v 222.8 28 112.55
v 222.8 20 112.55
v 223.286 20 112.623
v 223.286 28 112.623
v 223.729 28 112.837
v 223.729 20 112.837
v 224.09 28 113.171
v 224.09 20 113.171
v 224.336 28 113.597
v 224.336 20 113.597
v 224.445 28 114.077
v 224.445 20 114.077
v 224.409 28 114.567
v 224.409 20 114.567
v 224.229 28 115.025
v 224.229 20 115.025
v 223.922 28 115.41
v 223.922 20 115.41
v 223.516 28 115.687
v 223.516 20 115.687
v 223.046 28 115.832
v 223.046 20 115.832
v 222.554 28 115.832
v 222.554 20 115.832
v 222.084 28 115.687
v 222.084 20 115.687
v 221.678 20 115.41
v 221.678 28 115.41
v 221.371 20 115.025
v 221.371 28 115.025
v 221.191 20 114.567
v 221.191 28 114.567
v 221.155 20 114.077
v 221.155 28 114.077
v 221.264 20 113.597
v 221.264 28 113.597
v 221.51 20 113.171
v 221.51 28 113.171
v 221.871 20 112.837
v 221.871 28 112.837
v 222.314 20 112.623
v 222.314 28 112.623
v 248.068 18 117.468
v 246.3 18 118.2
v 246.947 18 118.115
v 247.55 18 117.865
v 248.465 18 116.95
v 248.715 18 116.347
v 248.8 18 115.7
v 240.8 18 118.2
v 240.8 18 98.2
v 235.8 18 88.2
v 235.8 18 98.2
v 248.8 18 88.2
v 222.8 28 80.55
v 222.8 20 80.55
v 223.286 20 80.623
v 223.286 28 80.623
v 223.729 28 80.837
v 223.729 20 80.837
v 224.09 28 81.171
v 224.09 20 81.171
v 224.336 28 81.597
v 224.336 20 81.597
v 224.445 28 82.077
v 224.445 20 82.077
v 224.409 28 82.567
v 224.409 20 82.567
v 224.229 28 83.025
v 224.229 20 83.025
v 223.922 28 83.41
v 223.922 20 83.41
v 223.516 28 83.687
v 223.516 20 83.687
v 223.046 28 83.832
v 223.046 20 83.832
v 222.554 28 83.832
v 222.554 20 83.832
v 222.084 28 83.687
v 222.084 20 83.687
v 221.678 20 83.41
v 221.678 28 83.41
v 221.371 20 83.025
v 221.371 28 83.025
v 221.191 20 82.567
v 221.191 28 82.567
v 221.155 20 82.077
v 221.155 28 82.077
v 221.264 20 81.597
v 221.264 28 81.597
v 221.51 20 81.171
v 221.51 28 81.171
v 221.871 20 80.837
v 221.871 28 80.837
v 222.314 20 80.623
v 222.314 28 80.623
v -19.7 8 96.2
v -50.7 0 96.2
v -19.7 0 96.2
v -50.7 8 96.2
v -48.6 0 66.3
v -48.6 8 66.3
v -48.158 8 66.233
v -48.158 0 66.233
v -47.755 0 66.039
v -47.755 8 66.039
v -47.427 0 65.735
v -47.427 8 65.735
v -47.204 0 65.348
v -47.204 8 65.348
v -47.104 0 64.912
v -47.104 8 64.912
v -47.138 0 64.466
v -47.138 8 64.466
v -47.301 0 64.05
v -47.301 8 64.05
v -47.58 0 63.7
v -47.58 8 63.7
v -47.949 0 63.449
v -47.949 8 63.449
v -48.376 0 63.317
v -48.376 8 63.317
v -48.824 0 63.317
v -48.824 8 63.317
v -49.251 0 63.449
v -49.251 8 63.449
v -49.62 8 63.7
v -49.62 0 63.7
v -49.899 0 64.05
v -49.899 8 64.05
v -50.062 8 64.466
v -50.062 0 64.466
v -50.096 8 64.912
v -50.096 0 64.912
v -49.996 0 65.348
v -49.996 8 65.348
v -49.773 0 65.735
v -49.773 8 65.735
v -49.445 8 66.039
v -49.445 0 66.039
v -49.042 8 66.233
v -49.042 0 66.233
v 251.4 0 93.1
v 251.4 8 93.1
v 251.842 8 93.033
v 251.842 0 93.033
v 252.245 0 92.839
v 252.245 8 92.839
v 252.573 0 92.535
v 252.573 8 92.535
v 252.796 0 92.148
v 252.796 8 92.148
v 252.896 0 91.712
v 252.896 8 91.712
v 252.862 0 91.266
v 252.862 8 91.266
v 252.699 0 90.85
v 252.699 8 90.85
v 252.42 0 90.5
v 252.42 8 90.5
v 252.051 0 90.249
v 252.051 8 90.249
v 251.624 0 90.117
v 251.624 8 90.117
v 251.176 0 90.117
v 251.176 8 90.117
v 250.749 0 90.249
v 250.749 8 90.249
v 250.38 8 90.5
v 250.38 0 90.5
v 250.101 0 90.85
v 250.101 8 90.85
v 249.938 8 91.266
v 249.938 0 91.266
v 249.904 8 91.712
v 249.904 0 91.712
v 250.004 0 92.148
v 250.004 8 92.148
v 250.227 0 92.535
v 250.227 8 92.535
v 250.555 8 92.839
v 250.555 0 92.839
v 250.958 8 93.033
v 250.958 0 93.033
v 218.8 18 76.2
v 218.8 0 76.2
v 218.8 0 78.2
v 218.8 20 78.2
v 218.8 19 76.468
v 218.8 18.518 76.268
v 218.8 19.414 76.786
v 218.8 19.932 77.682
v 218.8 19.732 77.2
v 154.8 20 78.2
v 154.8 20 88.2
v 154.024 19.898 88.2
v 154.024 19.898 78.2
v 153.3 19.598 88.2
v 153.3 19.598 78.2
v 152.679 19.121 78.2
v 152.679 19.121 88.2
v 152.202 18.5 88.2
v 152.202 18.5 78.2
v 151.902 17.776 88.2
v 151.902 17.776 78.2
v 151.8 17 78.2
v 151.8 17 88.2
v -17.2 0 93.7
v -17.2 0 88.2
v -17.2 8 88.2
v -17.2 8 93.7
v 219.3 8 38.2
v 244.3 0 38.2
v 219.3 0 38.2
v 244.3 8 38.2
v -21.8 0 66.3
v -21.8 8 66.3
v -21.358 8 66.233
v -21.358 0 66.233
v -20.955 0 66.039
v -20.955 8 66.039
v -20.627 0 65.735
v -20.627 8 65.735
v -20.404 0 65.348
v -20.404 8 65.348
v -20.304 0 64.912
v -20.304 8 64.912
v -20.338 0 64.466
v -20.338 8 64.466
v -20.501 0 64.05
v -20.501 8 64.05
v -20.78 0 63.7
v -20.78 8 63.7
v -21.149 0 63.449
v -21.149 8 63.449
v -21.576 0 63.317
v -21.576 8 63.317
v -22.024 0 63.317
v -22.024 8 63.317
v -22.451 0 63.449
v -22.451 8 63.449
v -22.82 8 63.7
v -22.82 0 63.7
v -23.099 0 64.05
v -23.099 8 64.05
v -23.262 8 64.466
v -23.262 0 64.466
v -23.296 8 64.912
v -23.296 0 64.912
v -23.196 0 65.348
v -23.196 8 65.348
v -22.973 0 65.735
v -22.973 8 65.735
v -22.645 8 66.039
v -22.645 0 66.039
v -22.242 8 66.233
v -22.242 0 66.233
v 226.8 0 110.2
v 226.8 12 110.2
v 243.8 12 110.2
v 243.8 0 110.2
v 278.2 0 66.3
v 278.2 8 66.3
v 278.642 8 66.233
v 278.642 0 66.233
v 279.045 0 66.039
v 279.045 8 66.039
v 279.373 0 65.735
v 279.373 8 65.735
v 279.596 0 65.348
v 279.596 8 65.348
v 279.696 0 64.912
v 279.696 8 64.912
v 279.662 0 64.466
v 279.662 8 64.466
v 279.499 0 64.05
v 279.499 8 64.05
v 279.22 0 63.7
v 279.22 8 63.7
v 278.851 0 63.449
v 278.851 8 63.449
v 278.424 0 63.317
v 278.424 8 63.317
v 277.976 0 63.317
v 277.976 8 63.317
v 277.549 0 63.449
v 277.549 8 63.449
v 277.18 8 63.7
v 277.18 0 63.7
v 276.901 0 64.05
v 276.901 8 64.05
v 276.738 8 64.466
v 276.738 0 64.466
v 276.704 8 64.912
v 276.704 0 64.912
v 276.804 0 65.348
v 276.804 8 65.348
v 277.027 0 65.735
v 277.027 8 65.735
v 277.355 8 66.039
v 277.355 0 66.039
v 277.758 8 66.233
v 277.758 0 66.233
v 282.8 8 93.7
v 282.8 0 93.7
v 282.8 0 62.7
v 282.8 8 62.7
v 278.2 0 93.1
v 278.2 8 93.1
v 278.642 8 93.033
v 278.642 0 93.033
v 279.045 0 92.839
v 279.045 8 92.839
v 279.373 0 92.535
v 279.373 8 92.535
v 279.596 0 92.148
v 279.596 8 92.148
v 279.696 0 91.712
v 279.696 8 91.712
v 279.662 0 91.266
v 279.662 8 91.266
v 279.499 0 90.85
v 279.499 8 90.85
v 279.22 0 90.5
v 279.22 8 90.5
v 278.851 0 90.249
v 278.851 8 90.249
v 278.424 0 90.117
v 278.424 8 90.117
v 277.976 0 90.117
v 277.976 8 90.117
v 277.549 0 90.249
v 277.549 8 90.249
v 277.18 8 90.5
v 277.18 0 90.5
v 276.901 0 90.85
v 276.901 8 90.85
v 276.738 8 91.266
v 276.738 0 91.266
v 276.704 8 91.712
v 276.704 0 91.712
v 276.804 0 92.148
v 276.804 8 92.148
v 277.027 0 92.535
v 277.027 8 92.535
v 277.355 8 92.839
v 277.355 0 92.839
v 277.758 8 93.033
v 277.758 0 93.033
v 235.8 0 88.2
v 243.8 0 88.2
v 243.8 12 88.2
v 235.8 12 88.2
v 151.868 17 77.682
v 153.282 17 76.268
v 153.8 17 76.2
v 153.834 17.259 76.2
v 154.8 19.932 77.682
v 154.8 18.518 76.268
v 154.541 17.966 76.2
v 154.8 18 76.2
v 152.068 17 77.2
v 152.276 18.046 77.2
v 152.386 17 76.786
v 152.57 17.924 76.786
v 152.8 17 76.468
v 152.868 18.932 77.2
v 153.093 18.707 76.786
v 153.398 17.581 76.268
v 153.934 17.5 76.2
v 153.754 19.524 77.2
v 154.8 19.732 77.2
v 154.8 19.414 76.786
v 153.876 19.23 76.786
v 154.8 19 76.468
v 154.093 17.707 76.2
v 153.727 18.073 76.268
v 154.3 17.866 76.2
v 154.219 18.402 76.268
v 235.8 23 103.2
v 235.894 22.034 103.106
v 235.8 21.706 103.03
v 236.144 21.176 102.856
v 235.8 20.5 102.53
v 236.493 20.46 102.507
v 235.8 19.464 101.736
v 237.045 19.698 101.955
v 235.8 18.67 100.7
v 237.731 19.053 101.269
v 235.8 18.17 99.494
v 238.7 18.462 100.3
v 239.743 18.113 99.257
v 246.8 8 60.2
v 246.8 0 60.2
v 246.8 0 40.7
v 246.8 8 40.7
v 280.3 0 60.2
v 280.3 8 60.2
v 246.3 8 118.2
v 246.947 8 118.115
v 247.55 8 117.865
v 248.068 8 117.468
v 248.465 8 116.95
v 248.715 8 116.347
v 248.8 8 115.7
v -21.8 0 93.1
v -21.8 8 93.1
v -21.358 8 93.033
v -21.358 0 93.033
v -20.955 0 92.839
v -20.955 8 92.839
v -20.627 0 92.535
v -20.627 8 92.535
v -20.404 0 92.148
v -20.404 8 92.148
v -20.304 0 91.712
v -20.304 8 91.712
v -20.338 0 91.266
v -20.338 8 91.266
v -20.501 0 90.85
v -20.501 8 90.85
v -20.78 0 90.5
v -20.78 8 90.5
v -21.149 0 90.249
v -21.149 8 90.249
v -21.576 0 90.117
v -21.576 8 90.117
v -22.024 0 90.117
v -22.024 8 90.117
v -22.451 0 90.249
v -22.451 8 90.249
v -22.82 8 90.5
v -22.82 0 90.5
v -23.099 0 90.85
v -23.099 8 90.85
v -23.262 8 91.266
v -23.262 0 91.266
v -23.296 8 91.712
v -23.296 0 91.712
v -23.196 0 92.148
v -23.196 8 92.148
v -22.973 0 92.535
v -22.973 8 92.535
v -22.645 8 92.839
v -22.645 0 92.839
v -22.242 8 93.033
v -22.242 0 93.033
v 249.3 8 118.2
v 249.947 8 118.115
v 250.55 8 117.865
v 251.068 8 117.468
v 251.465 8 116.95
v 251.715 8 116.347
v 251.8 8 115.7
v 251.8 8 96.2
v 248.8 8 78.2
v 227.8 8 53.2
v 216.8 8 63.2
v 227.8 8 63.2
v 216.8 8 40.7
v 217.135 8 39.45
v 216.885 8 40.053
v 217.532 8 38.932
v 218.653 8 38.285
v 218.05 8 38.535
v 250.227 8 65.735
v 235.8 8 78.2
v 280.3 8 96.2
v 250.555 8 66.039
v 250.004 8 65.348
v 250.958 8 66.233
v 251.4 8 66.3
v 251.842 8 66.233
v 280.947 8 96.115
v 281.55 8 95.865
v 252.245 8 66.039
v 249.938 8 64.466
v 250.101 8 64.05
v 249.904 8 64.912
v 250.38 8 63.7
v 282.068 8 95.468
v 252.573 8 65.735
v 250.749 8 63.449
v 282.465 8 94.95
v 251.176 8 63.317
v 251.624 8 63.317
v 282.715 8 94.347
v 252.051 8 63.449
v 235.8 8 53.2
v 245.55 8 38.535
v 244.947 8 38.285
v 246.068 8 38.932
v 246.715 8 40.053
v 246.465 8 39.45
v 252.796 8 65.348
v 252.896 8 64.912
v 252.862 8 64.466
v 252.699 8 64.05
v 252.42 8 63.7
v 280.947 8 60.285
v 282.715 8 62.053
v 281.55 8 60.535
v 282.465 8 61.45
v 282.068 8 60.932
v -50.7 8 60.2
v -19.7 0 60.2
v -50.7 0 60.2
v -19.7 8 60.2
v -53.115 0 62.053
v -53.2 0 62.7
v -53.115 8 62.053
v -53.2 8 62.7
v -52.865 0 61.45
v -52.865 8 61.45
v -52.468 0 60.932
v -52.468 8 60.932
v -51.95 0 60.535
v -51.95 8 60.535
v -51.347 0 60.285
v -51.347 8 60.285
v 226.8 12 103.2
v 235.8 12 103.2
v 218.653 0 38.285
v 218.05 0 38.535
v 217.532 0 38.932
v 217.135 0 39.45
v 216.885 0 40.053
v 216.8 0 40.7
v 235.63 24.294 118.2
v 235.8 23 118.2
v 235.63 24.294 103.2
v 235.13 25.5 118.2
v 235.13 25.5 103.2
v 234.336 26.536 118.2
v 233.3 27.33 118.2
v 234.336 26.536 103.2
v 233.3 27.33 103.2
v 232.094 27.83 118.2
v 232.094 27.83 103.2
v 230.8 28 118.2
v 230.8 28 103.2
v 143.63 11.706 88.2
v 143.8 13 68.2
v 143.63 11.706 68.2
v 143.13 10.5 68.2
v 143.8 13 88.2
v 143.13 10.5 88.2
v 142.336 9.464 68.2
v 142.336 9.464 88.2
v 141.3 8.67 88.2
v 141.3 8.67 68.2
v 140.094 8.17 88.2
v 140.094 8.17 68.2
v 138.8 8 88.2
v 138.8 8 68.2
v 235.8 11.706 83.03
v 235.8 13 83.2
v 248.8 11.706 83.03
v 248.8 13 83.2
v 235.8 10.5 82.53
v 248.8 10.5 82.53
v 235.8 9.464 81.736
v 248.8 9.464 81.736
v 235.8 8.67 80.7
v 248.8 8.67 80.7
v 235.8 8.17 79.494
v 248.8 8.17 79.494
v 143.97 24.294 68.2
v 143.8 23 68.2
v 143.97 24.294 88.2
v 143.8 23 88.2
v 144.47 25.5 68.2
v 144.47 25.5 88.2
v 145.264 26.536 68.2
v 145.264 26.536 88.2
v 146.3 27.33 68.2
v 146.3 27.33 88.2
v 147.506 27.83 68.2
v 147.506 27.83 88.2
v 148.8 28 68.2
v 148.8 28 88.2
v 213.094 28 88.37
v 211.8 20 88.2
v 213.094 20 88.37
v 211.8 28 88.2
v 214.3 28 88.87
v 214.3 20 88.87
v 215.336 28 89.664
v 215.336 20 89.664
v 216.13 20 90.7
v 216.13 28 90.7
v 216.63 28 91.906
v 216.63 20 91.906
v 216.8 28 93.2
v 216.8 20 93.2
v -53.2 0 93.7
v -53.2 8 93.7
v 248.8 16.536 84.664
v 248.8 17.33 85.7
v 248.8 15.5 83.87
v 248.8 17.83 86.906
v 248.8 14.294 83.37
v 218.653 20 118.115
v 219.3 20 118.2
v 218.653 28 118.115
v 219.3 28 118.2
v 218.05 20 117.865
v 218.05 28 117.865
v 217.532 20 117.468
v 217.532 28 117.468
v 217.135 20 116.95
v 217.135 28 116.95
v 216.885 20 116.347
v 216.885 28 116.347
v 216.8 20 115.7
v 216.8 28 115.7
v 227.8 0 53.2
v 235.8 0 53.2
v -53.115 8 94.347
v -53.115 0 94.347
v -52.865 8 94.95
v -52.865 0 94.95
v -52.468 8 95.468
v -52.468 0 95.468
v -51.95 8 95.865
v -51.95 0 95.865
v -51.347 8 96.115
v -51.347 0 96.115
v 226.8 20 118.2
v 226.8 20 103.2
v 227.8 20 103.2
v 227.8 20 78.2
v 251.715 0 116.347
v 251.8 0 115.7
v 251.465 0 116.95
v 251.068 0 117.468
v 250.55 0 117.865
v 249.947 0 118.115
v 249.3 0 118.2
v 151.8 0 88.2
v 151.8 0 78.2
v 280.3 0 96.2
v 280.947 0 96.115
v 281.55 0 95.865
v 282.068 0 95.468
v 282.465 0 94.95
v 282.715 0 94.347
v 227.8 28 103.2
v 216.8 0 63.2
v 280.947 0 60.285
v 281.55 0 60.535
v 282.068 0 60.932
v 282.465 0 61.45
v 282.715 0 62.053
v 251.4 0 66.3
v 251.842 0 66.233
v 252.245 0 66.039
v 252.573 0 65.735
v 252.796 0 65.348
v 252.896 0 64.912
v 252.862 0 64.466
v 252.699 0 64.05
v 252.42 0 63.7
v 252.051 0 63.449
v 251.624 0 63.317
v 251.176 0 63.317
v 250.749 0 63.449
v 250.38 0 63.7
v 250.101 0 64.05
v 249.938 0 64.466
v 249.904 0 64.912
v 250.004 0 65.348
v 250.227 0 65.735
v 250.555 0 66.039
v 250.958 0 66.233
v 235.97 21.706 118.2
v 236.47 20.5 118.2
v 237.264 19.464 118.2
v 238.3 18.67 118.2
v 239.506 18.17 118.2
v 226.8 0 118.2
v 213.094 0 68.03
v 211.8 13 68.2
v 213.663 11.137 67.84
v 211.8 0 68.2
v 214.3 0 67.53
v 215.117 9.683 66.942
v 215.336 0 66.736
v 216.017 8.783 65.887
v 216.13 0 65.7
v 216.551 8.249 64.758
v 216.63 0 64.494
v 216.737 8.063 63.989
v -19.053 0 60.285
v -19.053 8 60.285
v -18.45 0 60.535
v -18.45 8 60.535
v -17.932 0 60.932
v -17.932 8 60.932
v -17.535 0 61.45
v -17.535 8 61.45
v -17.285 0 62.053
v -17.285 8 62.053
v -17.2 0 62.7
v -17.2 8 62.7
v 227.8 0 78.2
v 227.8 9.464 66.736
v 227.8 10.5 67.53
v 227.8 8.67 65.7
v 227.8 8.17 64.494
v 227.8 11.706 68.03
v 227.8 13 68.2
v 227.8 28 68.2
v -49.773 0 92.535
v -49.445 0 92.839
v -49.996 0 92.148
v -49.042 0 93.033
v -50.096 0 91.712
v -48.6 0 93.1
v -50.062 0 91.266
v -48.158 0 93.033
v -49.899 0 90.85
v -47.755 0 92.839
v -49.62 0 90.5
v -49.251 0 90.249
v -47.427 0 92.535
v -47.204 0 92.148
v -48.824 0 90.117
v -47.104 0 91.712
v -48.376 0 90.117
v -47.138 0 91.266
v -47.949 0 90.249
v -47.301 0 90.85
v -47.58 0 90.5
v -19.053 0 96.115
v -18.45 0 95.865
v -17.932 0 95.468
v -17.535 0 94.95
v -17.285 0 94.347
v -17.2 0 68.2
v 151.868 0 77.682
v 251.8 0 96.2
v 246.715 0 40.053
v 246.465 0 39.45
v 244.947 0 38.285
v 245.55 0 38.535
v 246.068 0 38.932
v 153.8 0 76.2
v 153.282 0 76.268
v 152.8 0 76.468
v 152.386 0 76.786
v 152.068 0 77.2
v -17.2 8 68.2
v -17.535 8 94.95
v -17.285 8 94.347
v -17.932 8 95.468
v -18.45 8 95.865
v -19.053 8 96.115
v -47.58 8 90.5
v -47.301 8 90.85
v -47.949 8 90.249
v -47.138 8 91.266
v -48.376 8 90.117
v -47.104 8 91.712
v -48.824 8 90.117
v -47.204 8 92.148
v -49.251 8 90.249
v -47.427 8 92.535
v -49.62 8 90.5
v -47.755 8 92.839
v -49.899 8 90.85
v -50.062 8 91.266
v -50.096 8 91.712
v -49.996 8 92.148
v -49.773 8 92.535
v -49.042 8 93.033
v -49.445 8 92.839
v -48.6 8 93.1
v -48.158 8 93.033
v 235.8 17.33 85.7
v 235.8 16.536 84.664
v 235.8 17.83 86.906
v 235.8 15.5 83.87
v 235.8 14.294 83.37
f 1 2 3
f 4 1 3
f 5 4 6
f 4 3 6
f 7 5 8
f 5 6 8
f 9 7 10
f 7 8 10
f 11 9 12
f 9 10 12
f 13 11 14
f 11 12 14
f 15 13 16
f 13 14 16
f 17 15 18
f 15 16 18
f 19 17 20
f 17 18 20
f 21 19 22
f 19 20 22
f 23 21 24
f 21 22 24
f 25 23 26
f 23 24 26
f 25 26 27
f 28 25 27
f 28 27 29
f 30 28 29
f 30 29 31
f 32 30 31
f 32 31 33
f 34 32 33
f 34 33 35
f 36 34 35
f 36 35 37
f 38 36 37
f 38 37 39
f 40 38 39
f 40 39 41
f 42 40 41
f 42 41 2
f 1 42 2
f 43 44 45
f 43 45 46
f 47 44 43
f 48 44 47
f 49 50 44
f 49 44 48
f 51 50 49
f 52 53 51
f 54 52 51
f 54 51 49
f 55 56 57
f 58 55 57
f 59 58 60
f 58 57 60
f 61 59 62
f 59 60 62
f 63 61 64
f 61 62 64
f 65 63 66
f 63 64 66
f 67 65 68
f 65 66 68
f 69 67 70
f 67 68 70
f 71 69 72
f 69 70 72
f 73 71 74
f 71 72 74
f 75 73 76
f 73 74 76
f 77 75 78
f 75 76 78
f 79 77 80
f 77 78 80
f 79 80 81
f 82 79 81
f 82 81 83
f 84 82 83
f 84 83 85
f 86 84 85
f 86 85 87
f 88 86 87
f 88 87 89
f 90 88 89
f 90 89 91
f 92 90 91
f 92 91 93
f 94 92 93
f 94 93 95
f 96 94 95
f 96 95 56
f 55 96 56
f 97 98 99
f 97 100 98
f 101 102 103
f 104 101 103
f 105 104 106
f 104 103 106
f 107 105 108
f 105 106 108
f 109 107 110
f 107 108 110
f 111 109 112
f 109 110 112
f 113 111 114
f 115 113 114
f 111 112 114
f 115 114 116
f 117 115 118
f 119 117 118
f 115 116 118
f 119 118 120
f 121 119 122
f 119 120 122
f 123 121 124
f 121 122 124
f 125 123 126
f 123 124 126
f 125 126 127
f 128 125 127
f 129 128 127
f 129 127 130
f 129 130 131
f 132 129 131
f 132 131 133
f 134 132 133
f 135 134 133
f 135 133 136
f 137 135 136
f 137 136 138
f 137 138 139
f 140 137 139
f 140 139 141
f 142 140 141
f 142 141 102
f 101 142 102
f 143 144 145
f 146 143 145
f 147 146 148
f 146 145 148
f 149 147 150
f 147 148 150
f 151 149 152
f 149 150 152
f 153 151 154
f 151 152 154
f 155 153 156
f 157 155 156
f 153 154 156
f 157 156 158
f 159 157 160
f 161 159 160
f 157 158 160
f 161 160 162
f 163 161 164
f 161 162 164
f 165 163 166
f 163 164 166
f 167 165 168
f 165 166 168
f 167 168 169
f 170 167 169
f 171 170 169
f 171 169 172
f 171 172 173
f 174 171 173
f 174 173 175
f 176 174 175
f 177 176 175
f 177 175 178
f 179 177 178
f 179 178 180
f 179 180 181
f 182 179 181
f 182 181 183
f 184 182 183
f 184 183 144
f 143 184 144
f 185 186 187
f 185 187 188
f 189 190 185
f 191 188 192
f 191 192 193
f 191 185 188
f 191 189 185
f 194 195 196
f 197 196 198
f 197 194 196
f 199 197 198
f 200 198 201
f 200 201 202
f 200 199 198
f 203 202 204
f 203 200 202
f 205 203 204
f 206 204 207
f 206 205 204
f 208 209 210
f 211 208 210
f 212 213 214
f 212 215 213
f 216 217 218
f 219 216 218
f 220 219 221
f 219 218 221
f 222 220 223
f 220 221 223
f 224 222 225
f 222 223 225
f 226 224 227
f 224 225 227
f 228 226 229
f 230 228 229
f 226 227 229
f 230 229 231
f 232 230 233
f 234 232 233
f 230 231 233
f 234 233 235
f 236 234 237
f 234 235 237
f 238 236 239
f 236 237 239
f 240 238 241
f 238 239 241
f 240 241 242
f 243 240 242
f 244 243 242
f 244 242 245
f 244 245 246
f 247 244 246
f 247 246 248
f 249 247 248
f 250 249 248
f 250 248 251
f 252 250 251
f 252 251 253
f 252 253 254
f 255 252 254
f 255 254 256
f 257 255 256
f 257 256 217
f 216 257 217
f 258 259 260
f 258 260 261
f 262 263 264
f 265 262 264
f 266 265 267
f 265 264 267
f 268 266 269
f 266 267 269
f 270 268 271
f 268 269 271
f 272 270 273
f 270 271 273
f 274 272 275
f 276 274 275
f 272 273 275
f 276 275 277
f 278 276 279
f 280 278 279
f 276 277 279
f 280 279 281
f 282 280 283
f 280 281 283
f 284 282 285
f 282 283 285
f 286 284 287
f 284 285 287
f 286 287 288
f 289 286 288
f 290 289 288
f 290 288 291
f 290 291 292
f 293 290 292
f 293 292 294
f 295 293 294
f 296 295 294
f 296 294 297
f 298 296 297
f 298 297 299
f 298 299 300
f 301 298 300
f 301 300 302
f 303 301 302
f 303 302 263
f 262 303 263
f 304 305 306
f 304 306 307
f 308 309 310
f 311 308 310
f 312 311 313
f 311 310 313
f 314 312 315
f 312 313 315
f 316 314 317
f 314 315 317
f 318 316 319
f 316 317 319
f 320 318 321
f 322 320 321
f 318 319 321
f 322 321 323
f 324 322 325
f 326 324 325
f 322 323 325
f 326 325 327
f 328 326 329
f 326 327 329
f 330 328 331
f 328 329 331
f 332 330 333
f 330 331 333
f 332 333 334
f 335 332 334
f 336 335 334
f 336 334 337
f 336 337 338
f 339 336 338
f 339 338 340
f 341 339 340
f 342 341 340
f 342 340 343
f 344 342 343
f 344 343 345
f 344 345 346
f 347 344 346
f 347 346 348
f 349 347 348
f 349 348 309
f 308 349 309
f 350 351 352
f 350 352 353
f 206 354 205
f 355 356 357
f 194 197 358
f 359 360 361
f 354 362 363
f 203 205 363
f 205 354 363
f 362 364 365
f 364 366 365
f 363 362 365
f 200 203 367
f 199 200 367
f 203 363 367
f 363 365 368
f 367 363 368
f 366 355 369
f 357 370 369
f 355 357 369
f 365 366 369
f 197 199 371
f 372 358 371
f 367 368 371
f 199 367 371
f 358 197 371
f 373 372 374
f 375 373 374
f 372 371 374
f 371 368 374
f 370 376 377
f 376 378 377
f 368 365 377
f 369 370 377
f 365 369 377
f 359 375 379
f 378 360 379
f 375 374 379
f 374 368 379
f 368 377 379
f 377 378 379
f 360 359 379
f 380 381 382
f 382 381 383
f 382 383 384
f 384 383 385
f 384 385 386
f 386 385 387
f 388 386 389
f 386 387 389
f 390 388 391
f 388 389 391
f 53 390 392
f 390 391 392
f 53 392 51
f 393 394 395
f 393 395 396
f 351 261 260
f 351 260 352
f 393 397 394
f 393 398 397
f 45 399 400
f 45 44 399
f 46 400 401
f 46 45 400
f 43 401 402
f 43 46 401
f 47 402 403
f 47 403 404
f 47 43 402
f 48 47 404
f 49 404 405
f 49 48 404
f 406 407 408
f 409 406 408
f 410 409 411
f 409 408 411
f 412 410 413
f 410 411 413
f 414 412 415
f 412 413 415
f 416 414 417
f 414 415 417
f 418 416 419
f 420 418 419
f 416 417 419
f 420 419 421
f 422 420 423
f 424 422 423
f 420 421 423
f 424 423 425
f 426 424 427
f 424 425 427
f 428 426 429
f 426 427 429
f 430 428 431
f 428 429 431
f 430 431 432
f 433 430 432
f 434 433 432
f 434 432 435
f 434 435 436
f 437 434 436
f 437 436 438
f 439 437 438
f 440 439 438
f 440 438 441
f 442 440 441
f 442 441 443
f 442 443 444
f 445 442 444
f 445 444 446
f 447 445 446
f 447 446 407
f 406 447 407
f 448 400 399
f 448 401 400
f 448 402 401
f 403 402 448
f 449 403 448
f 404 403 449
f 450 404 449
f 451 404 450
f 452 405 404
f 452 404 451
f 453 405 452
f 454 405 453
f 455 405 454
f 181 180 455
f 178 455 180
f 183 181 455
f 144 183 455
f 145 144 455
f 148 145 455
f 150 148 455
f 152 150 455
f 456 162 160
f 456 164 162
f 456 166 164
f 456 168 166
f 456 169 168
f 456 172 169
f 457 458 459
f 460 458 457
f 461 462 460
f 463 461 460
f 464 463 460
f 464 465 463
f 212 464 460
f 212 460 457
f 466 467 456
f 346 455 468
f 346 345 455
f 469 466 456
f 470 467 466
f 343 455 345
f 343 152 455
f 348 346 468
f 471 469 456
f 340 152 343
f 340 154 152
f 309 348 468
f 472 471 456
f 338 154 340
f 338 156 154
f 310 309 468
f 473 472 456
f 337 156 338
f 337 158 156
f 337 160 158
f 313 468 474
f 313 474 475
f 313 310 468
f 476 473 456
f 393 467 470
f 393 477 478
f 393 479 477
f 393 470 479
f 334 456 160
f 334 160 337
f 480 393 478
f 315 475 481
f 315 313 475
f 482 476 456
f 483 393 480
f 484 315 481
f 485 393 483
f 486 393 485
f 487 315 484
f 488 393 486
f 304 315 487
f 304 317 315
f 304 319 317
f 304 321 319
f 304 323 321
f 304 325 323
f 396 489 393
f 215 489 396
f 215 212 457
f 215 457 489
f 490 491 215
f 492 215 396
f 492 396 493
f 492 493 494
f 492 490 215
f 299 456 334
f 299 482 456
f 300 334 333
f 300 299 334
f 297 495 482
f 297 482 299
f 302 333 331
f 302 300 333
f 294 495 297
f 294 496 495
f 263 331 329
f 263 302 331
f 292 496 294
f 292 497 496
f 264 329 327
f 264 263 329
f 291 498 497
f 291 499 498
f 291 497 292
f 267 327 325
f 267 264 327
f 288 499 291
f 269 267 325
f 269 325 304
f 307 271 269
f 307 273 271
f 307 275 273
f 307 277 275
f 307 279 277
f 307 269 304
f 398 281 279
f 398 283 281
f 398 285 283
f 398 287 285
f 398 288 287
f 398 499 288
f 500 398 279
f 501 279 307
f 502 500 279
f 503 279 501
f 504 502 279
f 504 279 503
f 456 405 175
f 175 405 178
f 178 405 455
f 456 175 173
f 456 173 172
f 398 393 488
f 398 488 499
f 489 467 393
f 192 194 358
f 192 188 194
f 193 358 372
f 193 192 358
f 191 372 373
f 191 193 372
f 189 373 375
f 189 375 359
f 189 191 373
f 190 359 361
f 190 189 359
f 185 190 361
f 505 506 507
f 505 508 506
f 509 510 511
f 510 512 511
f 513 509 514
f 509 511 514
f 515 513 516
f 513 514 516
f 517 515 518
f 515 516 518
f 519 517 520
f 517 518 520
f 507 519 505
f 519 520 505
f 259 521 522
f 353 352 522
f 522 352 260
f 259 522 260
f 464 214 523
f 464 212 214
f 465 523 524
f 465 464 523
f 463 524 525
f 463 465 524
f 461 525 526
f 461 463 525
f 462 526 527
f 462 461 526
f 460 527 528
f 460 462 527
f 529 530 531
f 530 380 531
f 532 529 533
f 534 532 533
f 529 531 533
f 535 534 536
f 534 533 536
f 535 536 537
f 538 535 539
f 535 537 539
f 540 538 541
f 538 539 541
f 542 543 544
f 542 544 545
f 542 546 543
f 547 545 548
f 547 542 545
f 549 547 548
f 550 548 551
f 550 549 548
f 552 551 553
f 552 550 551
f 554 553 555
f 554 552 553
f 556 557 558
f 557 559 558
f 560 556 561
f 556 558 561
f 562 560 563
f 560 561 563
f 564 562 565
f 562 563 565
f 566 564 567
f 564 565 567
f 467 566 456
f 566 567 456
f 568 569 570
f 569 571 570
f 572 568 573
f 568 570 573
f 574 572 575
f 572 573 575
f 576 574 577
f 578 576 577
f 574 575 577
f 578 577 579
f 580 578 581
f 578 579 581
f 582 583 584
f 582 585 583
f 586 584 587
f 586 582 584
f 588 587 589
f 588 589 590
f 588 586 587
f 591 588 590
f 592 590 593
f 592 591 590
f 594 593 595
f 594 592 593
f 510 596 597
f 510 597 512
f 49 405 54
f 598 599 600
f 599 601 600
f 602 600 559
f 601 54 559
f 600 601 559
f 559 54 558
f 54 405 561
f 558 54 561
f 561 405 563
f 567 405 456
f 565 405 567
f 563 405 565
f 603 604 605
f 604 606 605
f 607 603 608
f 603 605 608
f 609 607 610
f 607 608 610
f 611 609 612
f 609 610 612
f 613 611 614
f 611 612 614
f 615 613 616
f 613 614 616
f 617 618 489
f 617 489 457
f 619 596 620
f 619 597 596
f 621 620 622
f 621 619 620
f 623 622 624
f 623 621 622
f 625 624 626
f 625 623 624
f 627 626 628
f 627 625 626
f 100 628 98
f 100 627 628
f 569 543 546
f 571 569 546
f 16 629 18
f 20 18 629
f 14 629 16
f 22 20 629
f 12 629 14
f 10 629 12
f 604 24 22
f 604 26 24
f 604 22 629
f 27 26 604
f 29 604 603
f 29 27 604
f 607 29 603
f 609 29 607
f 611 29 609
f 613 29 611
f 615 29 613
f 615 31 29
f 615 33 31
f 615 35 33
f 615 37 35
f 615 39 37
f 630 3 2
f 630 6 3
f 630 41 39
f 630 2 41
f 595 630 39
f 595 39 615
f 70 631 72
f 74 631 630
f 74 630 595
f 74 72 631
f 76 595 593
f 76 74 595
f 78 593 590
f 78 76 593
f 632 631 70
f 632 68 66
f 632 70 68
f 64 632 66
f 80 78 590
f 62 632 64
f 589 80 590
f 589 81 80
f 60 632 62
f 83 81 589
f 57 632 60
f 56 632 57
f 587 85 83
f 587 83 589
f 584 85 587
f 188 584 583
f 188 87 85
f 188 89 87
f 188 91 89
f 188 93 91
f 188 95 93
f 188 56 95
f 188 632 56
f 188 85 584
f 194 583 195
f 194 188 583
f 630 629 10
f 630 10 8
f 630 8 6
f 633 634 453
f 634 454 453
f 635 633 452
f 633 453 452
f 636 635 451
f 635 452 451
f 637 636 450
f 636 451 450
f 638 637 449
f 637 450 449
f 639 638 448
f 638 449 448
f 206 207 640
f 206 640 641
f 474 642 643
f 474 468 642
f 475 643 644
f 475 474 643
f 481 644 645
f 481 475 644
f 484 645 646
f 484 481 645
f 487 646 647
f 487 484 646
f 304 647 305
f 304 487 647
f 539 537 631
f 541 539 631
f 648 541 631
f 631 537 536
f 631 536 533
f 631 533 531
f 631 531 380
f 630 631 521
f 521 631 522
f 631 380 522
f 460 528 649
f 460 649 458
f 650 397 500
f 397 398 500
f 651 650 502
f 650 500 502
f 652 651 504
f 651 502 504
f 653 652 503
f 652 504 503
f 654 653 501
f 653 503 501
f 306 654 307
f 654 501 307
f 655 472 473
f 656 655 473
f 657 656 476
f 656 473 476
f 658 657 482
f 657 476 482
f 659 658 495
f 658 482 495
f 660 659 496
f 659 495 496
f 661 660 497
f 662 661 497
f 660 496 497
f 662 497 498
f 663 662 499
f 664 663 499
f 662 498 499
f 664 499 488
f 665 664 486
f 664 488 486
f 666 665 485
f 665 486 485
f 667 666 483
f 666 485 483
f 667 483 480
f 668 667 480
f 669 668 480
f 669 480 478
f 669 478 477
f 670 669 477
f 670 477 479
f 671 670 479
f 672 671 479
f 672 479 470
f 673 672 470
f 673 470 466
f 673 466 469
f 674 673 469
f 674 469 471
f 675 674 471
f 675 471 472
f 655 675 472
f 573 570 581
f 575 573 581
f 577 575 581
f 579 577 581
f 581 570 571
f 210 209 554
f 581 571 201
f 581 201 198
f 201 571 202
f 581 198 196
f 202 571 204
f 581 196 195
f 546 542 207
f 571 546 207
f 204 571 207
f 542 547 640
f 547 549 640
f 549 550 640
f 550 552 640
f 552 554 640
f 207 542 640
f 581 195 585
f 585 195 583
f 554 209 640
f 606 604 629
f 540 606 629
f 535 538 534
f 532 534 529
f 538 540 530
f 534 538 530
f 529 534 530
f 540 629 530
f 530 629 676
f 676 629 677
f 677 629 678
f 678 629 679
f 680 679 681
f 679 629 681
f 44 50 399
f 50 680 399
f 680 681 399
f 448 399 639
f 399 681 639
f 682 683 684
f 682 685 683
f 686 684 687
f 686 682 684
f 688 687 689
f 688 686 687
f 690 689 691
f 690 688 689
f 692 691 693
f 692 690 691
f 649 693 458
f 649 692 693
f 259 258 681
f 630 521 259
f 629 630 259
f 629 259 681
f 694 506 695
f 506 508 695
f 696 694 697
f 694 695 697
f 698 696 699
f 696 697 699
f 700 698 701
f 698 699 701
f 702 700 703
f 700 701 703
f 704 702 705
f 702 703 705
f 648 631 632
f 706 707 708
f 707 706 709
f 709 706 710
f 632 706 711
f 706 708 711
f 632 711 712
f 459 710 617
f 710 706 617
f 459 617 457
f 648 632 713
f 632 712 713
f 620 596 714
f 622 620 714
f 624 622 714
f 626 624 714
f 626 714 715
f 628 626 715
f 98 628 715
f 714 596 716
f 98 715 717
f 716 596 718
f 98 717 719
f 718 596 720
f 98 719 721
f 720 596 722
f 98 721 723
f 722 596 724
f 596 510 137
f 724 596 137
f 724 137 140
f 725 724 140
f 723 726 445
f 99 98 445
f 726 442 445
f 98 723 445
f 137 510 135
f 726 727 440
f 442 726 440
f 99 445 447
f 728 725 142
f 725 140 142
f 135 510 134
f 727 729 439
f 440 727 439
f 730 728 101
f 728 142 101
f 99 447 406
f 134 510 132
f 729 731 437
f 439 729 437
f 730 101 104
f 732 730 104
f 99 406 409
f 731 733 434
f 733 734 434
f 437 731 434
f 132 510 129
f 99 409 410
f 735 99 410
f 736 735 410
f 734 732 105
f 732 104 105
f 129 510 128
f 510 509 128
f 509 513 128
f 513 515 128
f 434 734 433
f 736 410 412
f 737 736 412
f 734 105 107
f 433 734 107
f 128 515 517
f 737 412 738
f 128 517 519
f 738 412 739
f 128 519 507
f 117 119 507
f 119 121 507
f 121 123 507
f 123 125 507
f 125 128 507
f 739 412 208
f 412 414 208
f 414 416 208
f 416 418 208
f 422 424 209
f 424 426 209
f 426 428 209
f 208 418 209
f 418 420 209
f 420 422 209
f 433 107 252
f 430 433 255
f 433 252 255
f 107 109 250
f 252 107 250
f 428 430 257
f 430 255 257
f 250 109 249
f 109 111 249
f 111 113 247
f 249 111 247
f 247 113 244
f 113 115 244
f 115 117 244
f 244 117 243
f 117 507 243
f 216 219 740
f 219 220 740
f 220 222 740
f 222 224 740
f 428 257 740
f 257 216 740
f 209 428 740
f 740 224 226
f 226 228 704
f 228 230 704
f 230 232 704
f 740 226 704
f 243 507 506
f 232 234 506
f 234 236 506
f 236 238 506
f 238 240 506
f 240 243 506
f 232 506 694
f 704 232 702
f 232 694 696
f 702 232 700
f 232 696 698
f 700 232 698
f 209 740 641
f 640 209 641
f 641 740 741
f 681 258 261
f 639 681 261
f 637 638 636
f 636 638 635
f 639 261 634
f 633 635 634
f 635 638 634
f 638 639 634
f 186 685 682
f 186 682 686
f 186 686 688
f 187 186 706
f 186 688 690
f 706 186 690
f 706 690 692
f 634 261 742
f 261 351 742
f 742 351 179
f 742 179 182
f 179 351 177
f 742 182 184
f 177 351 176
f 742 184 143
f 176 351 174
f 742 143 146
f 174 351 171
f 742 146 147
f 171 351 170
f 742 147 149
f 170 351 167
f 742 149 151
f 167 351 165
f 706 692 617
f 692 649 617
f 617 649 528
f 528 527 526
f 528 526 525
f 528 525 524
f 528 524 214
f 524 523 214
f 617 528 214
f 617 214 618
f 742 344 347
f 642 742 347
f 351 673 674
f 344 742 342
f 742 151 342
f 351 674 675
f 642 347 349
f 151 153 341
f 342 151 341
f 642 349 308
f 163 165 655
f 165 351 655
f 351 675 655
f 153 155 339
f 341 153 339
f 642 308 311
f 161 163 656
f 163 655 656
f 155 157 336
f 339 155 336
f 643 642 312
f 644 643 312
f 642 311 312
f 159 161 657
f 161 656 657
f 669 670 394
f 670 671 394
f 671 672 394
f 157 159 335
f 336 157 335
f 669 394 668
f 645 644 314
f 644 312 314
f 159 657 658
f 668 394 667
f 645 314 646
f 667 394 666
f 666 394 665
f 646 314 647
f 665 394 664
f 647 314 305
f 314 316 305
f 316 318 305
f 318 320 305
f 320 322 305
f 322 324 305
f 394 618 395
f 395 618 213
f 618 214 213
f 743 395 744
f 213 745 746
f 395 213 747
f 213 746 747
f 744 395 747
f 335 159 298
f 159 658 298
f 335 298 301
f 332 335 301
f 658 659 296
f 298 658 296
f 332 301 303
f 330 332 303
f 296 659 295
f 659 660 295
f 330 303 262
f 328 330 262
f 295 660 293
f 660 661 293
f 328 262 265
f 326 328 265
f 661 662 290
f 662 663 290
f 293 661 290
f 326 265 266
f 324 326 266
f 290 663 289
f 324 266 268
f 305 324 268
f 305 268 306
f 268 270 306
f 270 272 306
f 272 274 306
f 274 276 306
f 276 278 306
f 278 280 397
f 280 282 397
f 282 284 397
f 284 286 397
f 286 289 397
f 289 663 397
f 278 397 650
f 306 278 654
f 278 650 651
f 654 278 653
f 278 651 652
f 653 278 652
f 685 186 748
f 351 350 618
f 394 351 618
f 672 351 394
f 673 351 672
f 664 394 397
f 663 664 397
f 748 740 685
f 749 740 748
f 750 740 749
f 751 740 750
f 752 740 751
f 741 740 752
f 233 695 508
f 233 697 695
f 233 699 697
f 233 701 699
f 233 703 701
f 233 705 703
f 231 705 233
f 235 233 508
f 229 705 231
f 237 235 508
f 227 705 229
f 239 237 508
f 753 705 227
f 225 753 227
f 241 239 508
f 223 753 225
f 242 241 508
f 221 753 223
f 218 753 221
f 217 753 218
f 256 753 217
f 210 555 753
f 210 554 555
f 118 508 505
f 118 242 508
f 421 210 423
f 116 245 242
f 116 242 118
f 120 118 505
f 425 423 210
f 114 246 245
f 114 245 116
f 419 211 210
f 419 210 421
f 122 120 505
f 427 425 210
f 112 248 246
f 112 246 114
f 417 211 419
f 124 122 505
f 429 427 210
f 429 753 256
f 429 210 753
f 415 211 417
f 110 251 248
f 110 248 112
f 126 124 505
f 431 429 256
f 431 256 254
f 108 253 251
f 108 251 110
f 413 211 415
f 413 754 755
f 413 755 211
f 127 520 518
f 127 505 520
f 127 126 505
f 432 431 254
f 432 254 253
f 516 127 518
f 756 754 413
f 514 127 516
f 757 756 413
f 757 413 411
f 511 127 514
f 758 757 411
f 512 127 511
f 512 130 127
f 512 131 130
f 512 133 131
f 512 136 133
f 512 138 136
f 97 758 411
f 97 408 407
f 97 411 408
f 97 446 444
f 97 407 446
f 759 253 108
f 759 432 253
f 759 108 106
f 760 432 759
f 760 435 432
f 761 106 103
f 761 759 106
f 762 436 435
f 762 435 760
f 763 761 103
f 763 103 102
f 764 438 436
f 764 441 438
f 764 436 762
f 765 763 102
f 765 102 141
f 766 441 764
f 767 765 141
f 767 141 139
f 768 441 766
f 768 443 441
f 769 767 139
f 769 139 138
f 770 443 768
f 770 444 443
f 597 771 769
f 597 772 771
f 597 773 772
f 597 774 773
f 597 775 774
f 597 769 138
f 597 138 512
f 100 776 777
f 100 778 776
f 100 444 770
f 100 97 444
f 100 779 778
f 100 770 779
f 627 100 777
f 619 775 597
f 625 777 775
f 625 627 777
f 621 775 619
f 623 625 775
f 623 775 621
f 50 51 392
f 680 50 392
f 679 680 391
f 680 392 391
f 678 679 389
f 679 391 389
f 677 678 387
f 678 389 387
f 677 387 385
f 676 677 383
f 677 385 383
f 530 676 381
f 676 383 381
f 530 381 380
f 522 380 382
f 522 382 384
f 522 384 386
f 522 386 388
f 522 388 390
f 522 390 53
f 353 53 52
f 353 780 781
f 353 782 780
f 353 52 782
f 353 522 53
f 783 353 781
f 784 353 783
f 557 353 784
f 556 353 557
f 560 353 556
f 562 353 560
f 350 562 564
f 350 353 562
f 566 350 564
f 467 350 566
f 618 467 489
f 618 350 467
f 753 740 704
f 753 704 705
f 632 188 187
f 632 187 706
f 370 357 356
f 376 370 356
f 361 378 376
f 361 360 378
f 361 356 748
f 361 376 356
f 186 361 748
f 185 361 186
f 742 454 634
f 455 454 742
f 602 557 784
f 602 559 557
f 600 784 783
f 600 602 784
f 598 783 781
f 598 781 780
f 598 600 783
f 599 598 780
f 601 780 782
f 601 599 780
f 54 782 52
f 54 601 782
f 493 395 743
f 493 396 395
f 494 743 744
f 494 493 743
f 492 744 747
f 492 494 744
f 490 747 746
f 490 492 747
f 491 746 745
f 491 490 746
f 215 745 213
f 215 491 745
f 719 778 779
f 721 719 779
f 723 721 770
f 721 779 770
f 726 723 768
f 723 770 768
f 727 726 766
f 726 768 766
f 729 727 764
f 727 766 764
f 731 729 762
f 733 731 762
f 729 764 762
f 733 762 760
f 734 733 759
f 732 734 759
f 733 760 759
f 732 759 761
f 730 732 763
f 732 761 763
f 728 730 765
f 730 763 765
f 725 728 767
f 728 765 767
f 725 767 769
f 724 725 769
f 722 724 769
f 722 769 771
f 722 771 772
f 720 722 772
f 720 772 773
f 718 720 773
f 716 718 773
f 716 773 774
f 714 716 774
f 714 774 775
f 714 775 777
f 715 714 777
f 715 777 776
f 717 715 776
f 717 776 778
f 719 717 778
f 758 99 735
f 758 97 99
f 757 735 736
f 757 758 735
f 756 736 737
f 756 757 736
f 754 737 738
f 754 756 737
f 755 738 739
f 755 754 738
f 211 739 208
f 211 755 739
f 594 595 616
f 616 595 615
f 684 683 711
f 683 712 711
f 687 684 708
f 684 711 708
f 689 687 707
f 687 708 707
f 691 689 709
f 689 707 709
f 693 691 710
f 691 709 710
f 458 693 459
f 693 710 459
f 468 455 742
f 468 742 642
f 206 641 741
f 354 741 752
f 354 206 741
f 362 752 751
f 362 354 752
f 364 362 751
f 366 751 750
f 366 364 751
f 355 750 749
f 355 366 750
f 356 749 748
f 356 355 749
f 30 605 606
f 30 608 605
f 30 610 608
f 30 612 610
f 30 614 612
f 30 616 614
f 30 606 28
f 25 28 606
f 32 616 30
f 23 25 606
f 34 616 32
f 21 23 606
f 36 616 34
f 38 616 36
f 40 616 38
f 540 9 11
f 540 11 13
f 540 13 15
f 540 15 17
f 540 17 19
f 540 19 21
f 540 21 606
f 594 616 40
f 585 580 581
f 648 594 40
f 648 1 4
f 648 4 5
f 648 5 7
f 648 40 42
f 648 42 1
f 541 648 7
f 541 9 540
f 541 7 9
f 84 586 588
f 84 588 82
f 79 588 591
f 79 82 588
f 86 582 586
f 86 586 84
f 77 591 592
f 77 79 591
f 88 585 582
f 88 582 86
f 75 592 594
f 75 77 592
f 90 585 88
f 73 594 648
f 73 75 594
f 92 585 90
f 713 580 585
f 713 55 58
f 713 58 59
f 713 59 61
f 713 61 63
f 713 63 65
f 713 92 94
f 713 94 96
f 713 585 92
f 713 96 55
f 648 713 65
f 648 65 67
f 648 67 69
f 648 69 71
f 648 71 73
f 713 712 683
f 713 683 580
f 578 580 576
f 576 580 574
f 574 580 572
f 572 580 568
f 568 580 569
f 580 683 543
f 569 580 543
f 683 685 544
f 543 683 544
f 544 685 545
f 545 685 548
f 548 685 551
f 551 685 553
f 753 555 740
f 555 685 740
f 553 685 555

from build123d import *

# Parameters (mm, degrees)
SKETCH1_W            = 70
SKETCH1_H            = 20
SKETCH1_W_2          = 264.8
EXTRUDE_1017_DEPTH   = 8
SKETCH2_W            = 36
SKETCH2_H            = 8
BOSS_EXTRUDE2_DEPTH  = 8
SKETCH4_W            = 36
SKETCH4_H            = 8
BOSS_EXTRUDE3_DEPTH  = 8
SKETCH5_R            = 1.5
CUT_EXTRUDE1_DEPTH   = 349.438631613
FILLET1_R            = 2.5
SKETCH6_W            = 52
SKETCH6_H            = 20
CUT_EXTRUDE2_DEPTH   = 349.438631613
SKETCH7_W            = 16.8
SKETCH7_H            = 20
CUT_EXTRUDE3_DEPTH   = 299.821485171
SKETCH8_W            = 30
SKETCH8_H            = 8
BOSS_EXTRUDE4_DEPTH  = 30
SKETCH9_W            = 30
SKETCH9_H            = 8
BOSS_EXTRUDE5_DEPTH  = 30
SKETCH10_W           = 8
SKETCH10_H           = 50
CUT_EXTRUDE4_DEPTH   = 307.61226329
SKETCH12_W           = 11
SKETCH12_H           = 50
BOSS_EXTRUDE6_DEPTH  = 17
SKETCH13_W           = 8
SKETCH13_H           = 15
BOSS_EXTRUDE7_DEPTH  = 17
SKETCH15_W           = 11
SKETCH15_H           = 45
CUT_EXTRUDE6_DEPTH   = 20
SKETCH16_W           = 22
SKETCH16_H           = 8
BOSS_EXTRUDE9_DEPTH  = 5
SKETCH18_W           = 13
SKETCH18_H           = 40
BOSS_EXTRUDE10_DEPTH = 10
SKETCH21_W           = 13
SKETCH21_H           = 5
CUT_EXTRUDE9_DEPTH   = 10
SKETCH17_W           = 16
SKETCH17_H           = 22
CUT_EXTRUDE7_DEPTH   = 12
SKETCH19_W           = 70
SKETCH19_H           = 20
BOSS_EXTRUDE11_DEPTH = 17
SKETCH20_W           = 65
SKETCH20_H           = 15
CUT_EXTRUDE8_DEPTH   = 20
SKETCH22_W           = 20
SKETCH22_H           = 17
BOSS_EXTRUDE12_DEPTH = 3
BOSS_EXTRUDE13_DEPTH = 3
SKETCH24_R           = 1.65
CUT_EXTRUDE10_DEPTH  = 308.159697877
BOSS_EXTRUDE14_DEPTH = 1
FILLET4_R            = 5
FILLET5_R            = 5
FILLET7_R            = 5
FILLET8_R            = 5
FILLET9_R            = 5
FILLET10_R           = 5
FILLET11_R           = 5
FILLET12_R           = 5
FILLET13_R           = 5
FILLET14_R           = 2.5
FILLET15_R           = 2.5
FILLET16_R           = 2.5
FILLET17_R           = 5
SKETCH26_W           = 76
SKETCH26_H           = 20
BOSS_EXTRUDE15_DEPTH = 3
FILLET18_R           = 3
SKETCH27_W           = 9
SKETCH27_H           = 20
BOSS_EXTRUDE16_DEPTH = 2
FILLET20_R           = 2


with BuildPart() as part:
    # Sketch1 → Extrude 1017 (new body)
    with BuildSketch(Plane(origin=(0, 0, 0), x_dir=(1, 0, 0), z_dir=(0, 1, 0))):
        with Locations((-35, -78.2)):
            Rectangle(SKETCH1_W, SKETCH1_H)
        with Locations((132.4, -78.2)):
            Rectangle(SKETCH1_W_2, SKETCH1_H)
        with Locations((299.8, -78.2)):
            Rectangle(SKETCH1_W, SKETCH1_H)
    extrude(amount=EXTRUDE_1017_DEPTH)

    # Sketch2 → Boss-Extrude2 (add)
    with BuildSketch(Plane(origin=(0, 0, 68.2), x_dir=(-1, 0, 0), z_dir=(0, 0, -1))):
        with Locations((35.2, 4)):
            Rectangle(SKETCH2_W, SKETCH2_H)
        with Locations((-264.8, 4)):
            Rectangle(SKETCH2_W, SKETCH2_H)
    extrude(amount=BOSS_EXTRUDE2_DEPTH)

    # Sketch4 → Boss-Extrude3 (add)
    with BuildSketch(Plane.XY.offset(88.2)):
        with Locations((-35.2, 4)):
            Rectangle(SKETCH4_W, SKETCH4_H)
        with Locations((264.8, 4)):
            Rectangle(SKETCH4_W, SKETCH4_H)
    extrude(amount=BOSS_EXTRUDE3_DEPTH)

    # Sketch5 → Cut-Extrude1 (cut, through all)
    with BuildSketch(Plane(origin=(0, 8, 0), x_dir=(1, 0, 0), z_dir=(0, 1, 0))):
        with Locations(Location((-48.6, -91.6, 0), (0, 0, 270))):
            Circle(SKETCH5_R)
        with Locations(Location((-21.8, -91.6, 0), (0, 0, 270))):
            Circle(SKETCH5_R)
        with Locations(Location((-21.8, -64.8, 0), (0, 0, 270))):
            Circle(SKETCH5_R)
        with Locations(Location((-48.6, -64.8, 0), (0, 0, 270))):
            Circle(SKETCH5_R)
        with Locations(Location((278.2, -91.6, 0), (0, 0, 270))):
            Circle(SKETCH5_R)
        with Locations(Location((251.4, -64.8, 0), (0, 0, 270))):
            Circle(SKETCH5_R)
        with Locations(Location((278.2, -64.8, 0), (0, 0, 270))):
            Circle(SKETCH5_R)
        with Locations(Location((251.4, -91.6, 0), (0, 0, 270))):
            Circle(SKETCH5_R)
    extrude(amount=-CUT_EXTRUDE1_DEPTH, mode=Mode.SUBTRACT)

    # Fillet1
    fillet1_edges = [part.edges().sort_by_distance(p)[0] for p in [
        (-53.2, 4, 60.2),
        (-17.2, 4, 60.2),
        (282.8, 4, 60.2),
        (-17.2, 4, 96.2),
        (-53.2, 4, 96.2),
        (282.8, 4, 96.2),
    ]]
    fillet(fillet1_edges, radius=FILLET1_R)

    # Sketch6 → Cut-Extrude2 (cut, through all)
    with BuildSketch(Plane(origin=(0, 8, 0), x_dir=(1, 0, 0), z_dir=(0, 1, 0))):
        with Locations((308.8, -78.2)):
            Rectangle(SKETCH6_W, SKETCH6_H)
    extrude(amount=-CUT_EXTRUDE2_DEPTH, mode=Mode.SUBTRACT)

    # Sketch7 → Cut-Extrude3 (cut, through all)
    with BuildSketch(Plane(origin=(0, 0, 0), x_dir=(-1, 0, 0), z_dir=(0, -1, 0))):
        with Locations((61.6, -78.2)):
            Rectangle(SKETCH7_W, SKETCH7_H)
    extrude(amount=-CUT_EXTRUDE3_DEPTH, mode=Mode.SUBTRACT)

    # Sketch8 → Boss-Extrude4 (add)
    with BuildSketch(Plane.XY.offset(88.2)):
        with Locations((231.8, 4)):
            Rectangle(SKETCH8_W, SKETCH8_H)
    extrude(amount=BOSS_EXTRUDE4_DEPTH)

    # Sketch9 → Boss-Extrude5 (add)
    with BuildSketch(Plane(origin=(0, 0, 68.2), x_dir=(-1, 0, 0), z_dir=(0, 0, -1))):
        with Locations((-231.8, 4)):
            Rectangle(SKETCH9_W, SKETCH9_H)
    extrude(amount=BOSS_EXTRUDE5_DEPTH)

    # Sketch10 → Cut-Extrude4 (cut, through all)
    with BuildSketch(Plane(origin=(0, 0, 0), x_dir=(-1, 0, 0), z_dir=(0, -1, 0))):
        with Locations((-231.8, -78.2)):
            Rectangle(SKETCH10_W, SKETCH10_H)
    extrude(amount=-CUT_EXTRUDE4_DEPTH, mode=Mode.SUBTRACT)

    # Sketch12 → Boss-Extrude6 (add)
    with BuildSketch(Plane(origin=(0, 8, 0), x_dir=(1, 0, 0), z_dir=(0, 1, 0))):
        with Locations((222.3, -93.2)):
            Rectangle(SKETCH12_W, SKETCH12_H)
    extrude(amount=BOSS_EXTRUDE6_DEPTH)

    # Sketch13 → Boss-Extrude7 (add)
    with BuildSketch(Plane(origin=(0, 8, 0), x_dir=(1, 0, 0), z_dir=(0, 1, 0))):
        with Locations((231.8, -110.7)):
            Rectangle(SKETCH13_W, SKETCH13_H)
    extrude(amount=BOSS_EXTRUDE7_DEPTH)

    # Sketch15 → Cut-Extrude6 (cut)
    with BuildSketch(Plane(origin=(0, 0, 0), x_dir=(-1, 0, 0), z_dir=(0, -1, 0))):
        with Locations((-222.3, -95.7)):
            Rectangle(SKETCH15_W, SKETCH15_H)
    extrude(amount=-CUT_EXTRUDE6_DEPTH, mode=Mode.SUBTRACT)

    # Sketch16 → Boss-Extrude9 (add)
    with BuildSketch(Plane(origin=(246.8, 0, 0), x_dir=(0, 0, -1), z_dir=(1, 0, 0))):
        with Locations((-107.2, 4)):
            Rectangle(SKETCH16_W, SKETCH16_H)
    extrude(amount=BOSS_EXTRUDE9_DEPTH)

    # Sketch18 → Boss-Extrude10 (add)
    with BuildSketch(Plane(origin=(0, 8, 0), x_dir=(1, 0, 0), z_dir=(0, 1, 0))):
        with Locations((242.3, -98.2)):
            Rectangle(SKETCH18_W, SKETCH18_H)
    extrude(amount=BOSS_EXTRUDE10_DEPTH)

    # Sketch21 → Cut-Extrude9 (cut)
    with BuildSketch(Plane(origin=(0, 18, 0), x_dir=(1, 0, 0), z_dir=(0, 1, 0))):
        with Locations((242.3, -80.7)):
            Rectangle(SKETCH21_W, SKETCH21_H)
    extrude(amount=-CUT_EXTRUDE9_DEPTH, mode=Mode.SUBTRACT)

    # Sketch17 → Cut-Extrude7 (cut)
    with BuildSketch(Plane(origin=(0, 0, 0), x_dir=(-1, 0, 0), z_dir=(0, -1, 0))):
        with Locations((-235.8, -99.2)):
            Rectangle(SKETCH17_W, SKETCH17_H)
    extrude(amount=-CUT_EXTRUDE7_DEPTH, mode=Mode.SUBTRACT)

    # Sketch19 → Boss-Extrude11 (add)
    with BuildSketch(Plane(origin=(0, 8, 0), x_dir=(1, 0, 0), z_dir=(0, 1, 0))):
        with Locations((181.8, -78.2)):
            Rectangle(SKETCH19_W, SKETCH19_H)
    extrude(amount=BOSS_EXTRUDE11_DEPTH)

    # Sketch20 → Cut-Extrude8 (cut)
    with BuildSketch(Plane(origin=(0, 0, 0), x_dir=(-1, 0, 0), z_dir=(0, -1, 0))):
        with Locations((-184.3, -80.7)):
            Rectangle(SKETCH20_W, SKETCH20_H)
    extrude(amount=-CUT_EXTRUDE8_DEPTH, mode=Mode.SUBTRACT)

    # Sketch22 → Boss-Extrude12 (add)
    with BuildSketch(Plane.ZY.offset(-146.8)):
        with Locations((78.2, 16.5)):
            Rectangle(SKETCH22_W, SKETCH22_H)
    extrude(amount=BOSS_EXTRUDE12_DEPTH)

    # Sketch23 → Boss-Extrude13 (add)
    with BuildSketch(Plane(origin=(0, 25, 0), x_dir=(1, 0, 0), z_dir=(0, 1, 0))):
        Polygon((143.8, -68.2), (143.8, -88.2), (216.8, -88.2), (216.8, -118.2), (235.8, -118.2), (235.8, -103.2), (227.8, -103.2), (227.8, -68.2), align=None)
    extrude(amount=BOSS_EXTRUDE13_DEPTH)

    # Sketch24 → Cut-Extrude10 (cut, through all)
    with BuildSketch(Plane(origin=(0, 20, 0), x_dir=(-1, 0, 0), z_dir=(0, -1, 0))):
        with Locations(Location((-222.8, -114.2, 0), (0, 0, 90))):
            Circle(SKETCH24_R)
        with Locations(Location((-222.8, -82.2, 0), (0, 0, 90))):
            Circle(SKETCH24_R)
    extrude(amount=-CUT_EXTRUDE10_DEPTH, mode=Mode.SUBTRACT)

    # Sketch25 → Boss-Extrude14 (add)
    with BuildSketch(Plane.ZY.offset(-227.8)):
        Polygon((103.2, 20), (103.2, 12), (110.2, 12), (110.2, 0), (118.2, 0), (118.2, 20), align=None)
    extrude(amount=BOSS_EXTRUDE14_DEPTH)

    # Fillet4
    fillet4_edges = [part.edges().sort_by_distance(p)[0] for p in [
        (143.8, 8, 78.2),
    ]]
    fillet(fillet4_edges, radius=FILLET4_R)

    # Fillet5
    fillet5_edges = [part.edges().sort_by_distance(p)[0] for p in [
        (143.8, 28, 78.2),
    ]]
    fillet(fillet5_edges, radius=FILLET5_R)

    # Fillet7
    fillet7_edges = [part.edges().sort_by_distance(p)[0] for p in [
        (222.3, 8, 68.2),
    ]]
    fillet(fillet7_edges, radius=FILLET7_R)

    # Fillet8
    fillet8_edges = [part.edges().sort_by_distance(p)[0] for p in [
        (235.8, 18, 110.7),
    ]]
    fillet(fillet8_edges, radius=FILLET8_R)

    # Fillet9
    fillet9_edges = [part.edges().sort_by_distance(p)[0] for p in [
        (235.8, 28, 110.7),
    ]]
    fillet(fillet9_edges, radius=FILLET9_R - 0.0001)  # a hair under: the kernel refuses the full size

    # Fillet10
    fillet10_edges = [part.edges().sort_by_distance(p)[0] for p in [
        (216.8, 6.5, 68.2),
    ]]
    fillet(fillet10_edges, radius=FILLET10_R)

    # Fillet11
    fillet11_edges = [part.edges().sort_by_distance(p)[0] for p in [
        (242.3, 8, 83.2),
    ]]
    fillet(fillet11_edges, radius=FILLET11_R)

    # Fillet12
    fillet12_edges = [part.edges().sort_by_distance(p)[0] for p in [
        (242.3, 18, 83.2),
    ]]
    fillet(fillet12_edges, radius=FILLET12_R - 0.0001)  # a hair under: the kernel refuses the full size

    # Fillet13
    fillet13_edges = [part.edges().sort_by_distance(p)[0] for p in [
        (216.8, 24, 88.2),
    ]]
    fillet(fillet13_edges, radius=FILLET13_R)

    # Fillet14
    fillet14_edges = [part.edges().sort_by_distance(p)[0] for p in [
        (246.8, 4, 38.2),
        (216.8, 4, 38.2),
    ]]
    fillet(fillet14_edges, radius=FILLET14_R)

    # Fillet15
    fillet15_edges = [part.edges().sort_by_distance(p)[0] for p in [
        (216.8, 24, 118.2),
        (251.8, 4, 118.2),
    ]]
    fillet(fillet15_edges, radius=FILLET15_R)

    # Fillet16
    fillet16_edges = [part.edges().sort_by_distance(p)[0] for p in [
        (248.8, 13, 118.2),
    ]]
    fillet(fillet16_edges, radius=FILLET16_R)

    # Fillet17
    fillet17_edges = [part.edges().sort_by_distance(p)[0] for p in [
        (238.3, 18, 103.2),
    ]]
    fillet(fillet17_edges, radius=FILLET17_R - 0.0001)  # a hair under: the kernel refuses the full size

    # Sketch26 → Boss-Extrude15 (add)
    with BuildSketch(Plane.XY.offset(73.2)):
        with Locations((189.8, 10)):
            Rectangle(SKETCH26_W, SKETCH26_H)
    extrude(amount=BOSS_EXTRUDE15_DEPTH)

    # Fillet18
    fillet18_edges = [part.edges().sort_by_distance(p)[0] for p in [
        (151.8, 20, 82.2),
    ]]
    fillet(fillet18_edges, radius=FILLET18_R)

    # Sketch27 → Boss-Extrude16 (add)
    with BuildSketch(Plane.XY.offset(76.2)):
        with Locations((223.3, 10)):
            Rectangle(SKETCH27_W, SKETCH27_H)
    extrude(amount=BOSS_EXTRUDE16_DEPTH)

    # Fillet20
    fillet20_edges = [part.edges().sort_by_distance(p)[0] for p in [
        (151.8, 8.5, 76.2),
        (152.678679656, 19.121320344, 76.2),
        (186.8, 20, 76.2),
    ]]
    fillet(fillet20_edges, radius=FILLET20_R)


solid = part.part
